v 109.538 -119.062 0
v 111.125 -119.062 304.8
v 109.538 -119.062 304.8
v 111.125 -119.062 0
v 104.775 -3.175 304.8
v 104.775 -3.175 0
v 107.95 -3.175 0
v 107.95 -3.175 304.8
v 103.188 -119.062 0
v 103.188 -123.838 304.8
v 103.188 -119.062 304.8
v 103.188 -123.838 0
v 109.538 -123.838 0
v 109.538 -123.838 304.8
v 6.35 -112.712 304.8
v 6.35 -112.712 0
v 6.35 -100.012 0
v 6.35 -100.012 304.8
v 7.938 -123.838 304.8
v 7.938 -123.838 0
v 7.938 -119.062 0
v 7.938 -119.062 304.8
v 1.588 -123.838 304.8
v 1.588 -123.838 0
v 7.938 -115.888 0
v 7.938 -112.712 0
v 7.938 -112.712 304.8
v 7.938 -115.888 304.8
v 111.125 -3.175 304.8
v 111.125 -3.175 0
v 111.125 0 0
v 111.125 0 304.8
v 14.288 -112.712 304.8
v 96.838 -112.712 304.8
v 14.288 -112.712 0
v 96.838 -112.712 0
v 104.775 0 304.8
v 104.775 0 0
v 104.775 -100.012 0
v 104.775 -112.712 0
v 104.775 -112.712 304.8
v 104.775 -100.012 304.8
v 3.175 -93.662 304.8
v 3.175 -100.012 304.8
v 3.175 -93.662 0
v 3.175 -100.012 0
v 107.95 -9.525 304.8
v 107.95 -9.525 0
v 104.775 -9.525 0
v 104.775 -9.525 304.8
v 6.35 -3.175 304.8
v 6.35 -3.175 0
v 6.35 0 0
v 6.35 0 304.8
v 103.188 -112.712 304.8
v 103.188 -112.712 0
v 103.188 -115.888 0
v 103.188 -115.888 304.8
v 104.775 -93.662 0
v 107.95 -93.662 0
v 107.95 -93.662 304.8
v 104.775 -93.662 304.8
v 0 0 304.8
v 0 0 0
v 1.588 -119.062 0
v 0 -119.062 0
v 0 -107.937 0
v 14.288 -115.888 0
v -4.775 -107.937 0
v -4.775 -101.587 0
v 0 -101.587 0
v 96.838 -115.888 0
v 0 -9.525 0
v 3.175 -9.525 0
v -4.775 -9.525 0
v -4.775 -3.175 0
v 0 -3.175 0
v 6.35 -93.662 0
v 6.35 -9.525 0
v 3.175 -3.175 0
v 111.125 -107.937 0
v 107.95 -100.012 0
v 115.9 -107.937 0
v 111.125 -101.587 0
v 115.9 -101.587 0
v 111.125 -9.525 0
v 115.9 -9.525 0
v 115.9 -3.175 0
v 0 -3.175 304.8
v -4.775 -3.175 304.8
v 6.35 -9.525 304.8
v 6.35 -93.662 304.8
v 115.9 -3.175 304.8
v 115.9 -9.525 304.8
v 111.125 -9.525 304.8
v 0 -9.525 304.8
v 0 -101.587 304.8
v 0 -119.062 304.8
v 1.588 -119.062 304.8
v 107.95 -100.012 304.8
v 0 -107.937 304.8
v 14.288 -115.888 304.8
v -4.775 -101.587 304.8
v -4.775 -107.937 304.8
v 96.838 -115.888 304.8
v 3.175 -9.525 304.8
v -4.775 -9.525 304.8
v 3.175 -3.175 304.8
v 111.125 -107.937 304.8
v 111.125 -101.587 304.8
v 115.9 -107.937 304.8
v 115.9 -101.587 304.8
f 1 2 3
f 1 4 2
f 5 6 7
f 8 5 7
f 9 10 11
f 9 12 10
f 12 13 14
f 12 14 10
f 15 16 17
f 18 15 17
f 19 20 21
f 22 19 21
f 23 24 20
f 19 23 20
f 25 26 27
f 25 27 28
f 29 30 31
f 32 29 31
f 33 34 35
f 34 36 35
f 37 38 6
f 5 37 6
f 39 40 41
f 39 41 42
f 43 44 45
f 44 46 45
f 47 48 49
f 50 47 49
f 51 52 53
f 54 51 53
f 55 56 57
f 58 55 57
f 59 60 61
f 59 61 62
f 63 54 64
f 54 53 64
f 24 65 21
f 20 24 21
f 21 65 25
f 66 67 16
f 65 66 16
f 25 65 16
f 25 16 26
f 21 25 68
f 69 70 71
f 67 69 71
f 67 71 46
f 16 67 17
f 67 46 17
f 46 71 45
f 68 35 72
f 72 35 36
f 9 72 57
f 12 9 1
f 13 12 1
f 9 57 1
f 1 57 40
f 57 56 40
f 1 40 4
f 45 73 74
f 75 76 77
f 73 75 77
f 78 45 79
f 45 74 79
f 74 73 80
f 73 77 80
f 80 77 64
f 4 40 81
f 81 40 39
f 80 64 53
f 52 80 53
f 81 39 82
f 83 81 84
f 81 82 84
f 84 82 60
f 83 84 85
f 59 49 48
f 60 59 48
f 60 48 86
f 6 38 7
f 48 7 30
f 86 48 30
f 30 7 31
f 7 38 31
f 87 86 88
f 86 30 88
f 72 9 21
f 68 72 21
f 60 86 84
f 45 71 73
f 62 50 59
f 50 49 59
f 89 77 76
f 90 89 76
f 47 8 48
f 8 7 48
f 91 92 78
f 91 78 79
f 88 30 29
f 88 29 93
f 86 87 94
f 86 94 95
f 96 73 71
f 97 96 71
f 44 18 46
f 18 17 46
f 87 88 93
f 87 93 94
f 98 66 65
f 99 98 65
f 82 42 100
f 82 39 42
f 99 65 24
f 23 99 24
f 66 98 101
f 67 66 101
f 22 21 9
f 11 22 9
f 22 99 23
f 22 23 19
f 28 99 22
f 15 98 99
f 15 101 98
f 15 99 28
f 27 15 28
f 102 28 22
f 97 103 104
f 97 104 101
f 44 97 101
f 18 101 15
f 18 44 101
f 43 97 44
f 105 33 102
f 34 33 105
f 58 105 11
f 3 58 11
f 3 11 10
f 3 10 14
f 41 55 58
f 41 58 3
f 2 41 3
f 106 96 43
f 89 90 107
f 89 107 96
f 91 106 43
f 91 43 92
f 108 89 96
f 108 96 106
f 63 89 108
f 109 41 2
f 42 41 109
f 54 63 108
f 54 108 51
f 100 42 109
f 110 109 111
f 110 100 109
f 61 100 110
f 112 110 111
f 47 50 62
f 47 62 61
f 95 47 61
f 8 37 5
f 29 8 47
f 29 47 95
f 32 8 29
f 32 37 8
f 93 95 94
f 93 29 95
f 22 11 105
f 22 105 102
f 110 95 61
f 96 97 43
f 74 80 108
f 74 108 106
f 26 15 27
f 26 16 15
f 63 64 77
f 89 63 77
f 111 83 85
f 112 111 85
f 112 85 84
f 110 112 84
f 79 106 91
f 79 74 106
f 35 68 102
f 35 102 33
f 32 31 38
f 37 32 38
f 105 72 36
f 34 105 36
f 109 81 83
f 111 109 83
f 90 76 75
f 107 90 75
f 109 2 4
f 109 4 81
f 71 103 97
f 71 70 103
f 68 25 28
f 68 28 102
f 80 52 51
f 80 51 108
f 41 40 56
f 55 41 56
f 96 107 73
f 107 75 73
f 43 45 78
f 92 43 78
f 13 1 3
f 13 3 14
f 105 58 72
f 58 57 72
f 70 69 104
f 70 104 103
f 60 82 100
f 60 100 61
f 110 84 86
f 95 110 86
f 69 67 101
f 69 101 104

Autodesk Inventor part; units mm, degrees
ref_plane "YZ Plane" through (0, 0, 0) normal (1, 0, 0) x (0, 1, 0)
ref_plane "XZ Plane" through (0, 0, 0) normal (0, 1, 0) x (-1, 0, 0)
ref_plane "XY Plane" through (0, 0, 0) normal (0, 0, 1) x (1, 0, 0)
sketch "Sketch1" plane through (0, 0, 0) normal (0, 0, 1) x (1, 0, 0)
  line L0 (111.125, 0) -> (104.775, 0)
  line L1 (6.35, 0) -> (0, 0)
  line L2 (0, 0) -> (0, -3.175)
  line L3 (0, -3.175) -> (-4.7752, -3.175)
  line L4 (-4.7752, -3.175) -> (-4.7752, -9.525)
  line L5 (-4.7752, -9.525) -> (0, -9.525)
  line L6 (0, -119.0625) -> (0, -107.9373)
  line L7 (0, -107.9373) -> (-4.7752, -107.9373)
  line L8 (-4.7752, -107.9373) -> (-4.7752, -101.5873)
  line L9 (-4.7752, -101.5873) -> (0, -101.5873)
  line L10 (0, -119.0625) -> (1.5875, -119.0625)
  line L11 (1.5875, -119.0625) -> (1.5875, -123.8377)
  line L12 (1.5875, -123.8377) -> (7.9375, -123.8377)
  line L13 (7.9375, -123.8377) -> (7.9375, -119.0625)
  line L14 (0, 0) -> (0, -3.175)
  line L15 (0, -9.525) -> (0, -101.5873)
  line L16 (0, -107.9373) -> (0, -119.0625)
  line L17 (0, -119.0625) -> (1.5875, -119.0625)
  line L18 (111.125, -3.175) -> (115.9002, -3.175)
  line L19 (115.9002, -3.175) -> (115.9002, -9.525)
  line L20 (115.9002, -9.525) -> (111.125, -9.525)
  line L21 (111.125, -3.175) -> (111.125, 0)
  line L22 (111.125, -107.9373) -> (115.9002, -107.9373)
  line L23 (115.9002, -107.9373) -> (115.9002, -101.5873)
  line L24 (115.9002, -101.5873) -> (111.125, -101.5873)
  line L25 (111.125, -119.0625) -> (111.125, -107.9373)
  line L26 (111.125, -101.5873) -> (111.125, -9.525)
  line L27 (111.125, -119.0625) -> (109.5375, -119.0625)
  line L28 (109.5375, -119.0625) -> (109.5375, -123.8377)
  line L29 (109.5375, -123.8377) -> (103.1875, -123.8377)
  line L30 (103.1875, -123.8377) -> (103.1875, -119.0625)
  line L31 (7.9375, -119.0625) -> (103.1875, -119.0625)
  line L32 (109.5375, -119.0625) -> (111.125, -119.0625)
  line L33 (6.35, -3.175) -> (3.175, -3.175)
  line L34 (3.175, -3.175) -> (3.175, -9.525)
  line L35 (3.175, -9.525) -> (6.35, -9.525)
  line L36 (6.35, -3.175) -> (6.35, 0)
  line L37 (104.775, -3.175) -> (107.95, -3.175)
  line L38 (107.95, -3.175) -> (107.95, -9.525)
  line L39 (107.95, -9.525) -> (104.775, -9.525)
  line L40 (104.775, 0) -> (104.775, -3.175)
  line L41 (6.35, -112.7125) -> (6.35, -100.0125)
  line L42 (6.35, -100.0125) -> (3.175, -100.0125)
  line L43 (3.175, -100.0125) -> (3.175, -93.6625)
  line L44 (3.175, -93.6625) -> (6.35, -93.6625)
  line L45 (6.35, -112.7125) -> (6.35, -100.0125)
  line L46 (6.35, -93.6625) -> (6.35, -9.525)
  line L47 (6.35, -112.7125) -> (7.9375, -112.7125)
  line L48 (7.9375, -112.7125) -> (7.9375, -115.8875)
  line L49 (7.9375, -115.8875) -> (14.2875, -115.8875)
  line L50 (14.2875, -115.8875) -> (14.2875, -112.7125)
  line L51 (7.9375, -112.7125) -> (6.35, -112.7125)
  line L52 (104.775, -112.7125) -> (103.1875, -112.7125)
  line L53 (103.1875, -112.7125) -> (103.1875, -115.8875)
  line L54 (103.1875, -115.8875) -> (96.8375, -115.8875)
  line L55 (96.8375, -115.8875) -> (96.8375, -112.7125)
  line L56 (104.775, -112.7125) -> (103.1875, -112.7125)
  line L57 (96.8375, -112.7125) -> (14.2875, -112.7125)
  line L58 (104.775, -112.7125) -> (104.775, -100.0125)
  line L59 (104.775, -100.0125) -> (107.95, -100.0125)
  line L60 (107.95, -100.0125) -> (107.95, -93.6625)
  line L61 (107.95, -93.6625) -> (104.775, -93.6625)
  line L62 (104.775, -9.525) -> (104.775, -93.6625)
  line L63 (104.775, -100.0125) -> (104.775, -112.7125)
  dimension "d0" = 119.0625
  dimension "d1" = 111.125
  dimension "d2" = 6.35
  dimension "d3" = 112.7125
  dimension "d4" = 98.425
  dimension "d7" = 119.0625
  dimension "d10" = 3.175
  dimension "d11" = 4.7752
  dimension "d12" = 6.35
  dimension "d13" = 11.1252
  dimension "d14" = 4.7752
  dimension "d15" = 6.35
  dimension "d16" = 1.5875
  dimension "d17" = 4.7752
  dimension "d18" = 6.35
  dimension "d19" = 4.7752
  dimension "d20" = 4.7752
  dimension "d21" = 1.5875
  dimension "d22" = 6.35
  dimension "d24" = 3.175
  dimension "d25" = 3.175
  dimension "d26" = 12.7
  dimension "d27" = 6.35
  dimension "d28" = 1.5875
  dimension "d29" = 3.175
  dimension "d30" = 6.35
  dimension "d31" = 1.5875
  dimension "d32" = 6.35
  dimension "d33" = 12.7
  dimension "d34" = 6.35
extrude "Extrusion1" add sketch "Sketch1" along normal blind 304.8
properties part number "CompactSlidePart2" material "Aluminum 6061"
